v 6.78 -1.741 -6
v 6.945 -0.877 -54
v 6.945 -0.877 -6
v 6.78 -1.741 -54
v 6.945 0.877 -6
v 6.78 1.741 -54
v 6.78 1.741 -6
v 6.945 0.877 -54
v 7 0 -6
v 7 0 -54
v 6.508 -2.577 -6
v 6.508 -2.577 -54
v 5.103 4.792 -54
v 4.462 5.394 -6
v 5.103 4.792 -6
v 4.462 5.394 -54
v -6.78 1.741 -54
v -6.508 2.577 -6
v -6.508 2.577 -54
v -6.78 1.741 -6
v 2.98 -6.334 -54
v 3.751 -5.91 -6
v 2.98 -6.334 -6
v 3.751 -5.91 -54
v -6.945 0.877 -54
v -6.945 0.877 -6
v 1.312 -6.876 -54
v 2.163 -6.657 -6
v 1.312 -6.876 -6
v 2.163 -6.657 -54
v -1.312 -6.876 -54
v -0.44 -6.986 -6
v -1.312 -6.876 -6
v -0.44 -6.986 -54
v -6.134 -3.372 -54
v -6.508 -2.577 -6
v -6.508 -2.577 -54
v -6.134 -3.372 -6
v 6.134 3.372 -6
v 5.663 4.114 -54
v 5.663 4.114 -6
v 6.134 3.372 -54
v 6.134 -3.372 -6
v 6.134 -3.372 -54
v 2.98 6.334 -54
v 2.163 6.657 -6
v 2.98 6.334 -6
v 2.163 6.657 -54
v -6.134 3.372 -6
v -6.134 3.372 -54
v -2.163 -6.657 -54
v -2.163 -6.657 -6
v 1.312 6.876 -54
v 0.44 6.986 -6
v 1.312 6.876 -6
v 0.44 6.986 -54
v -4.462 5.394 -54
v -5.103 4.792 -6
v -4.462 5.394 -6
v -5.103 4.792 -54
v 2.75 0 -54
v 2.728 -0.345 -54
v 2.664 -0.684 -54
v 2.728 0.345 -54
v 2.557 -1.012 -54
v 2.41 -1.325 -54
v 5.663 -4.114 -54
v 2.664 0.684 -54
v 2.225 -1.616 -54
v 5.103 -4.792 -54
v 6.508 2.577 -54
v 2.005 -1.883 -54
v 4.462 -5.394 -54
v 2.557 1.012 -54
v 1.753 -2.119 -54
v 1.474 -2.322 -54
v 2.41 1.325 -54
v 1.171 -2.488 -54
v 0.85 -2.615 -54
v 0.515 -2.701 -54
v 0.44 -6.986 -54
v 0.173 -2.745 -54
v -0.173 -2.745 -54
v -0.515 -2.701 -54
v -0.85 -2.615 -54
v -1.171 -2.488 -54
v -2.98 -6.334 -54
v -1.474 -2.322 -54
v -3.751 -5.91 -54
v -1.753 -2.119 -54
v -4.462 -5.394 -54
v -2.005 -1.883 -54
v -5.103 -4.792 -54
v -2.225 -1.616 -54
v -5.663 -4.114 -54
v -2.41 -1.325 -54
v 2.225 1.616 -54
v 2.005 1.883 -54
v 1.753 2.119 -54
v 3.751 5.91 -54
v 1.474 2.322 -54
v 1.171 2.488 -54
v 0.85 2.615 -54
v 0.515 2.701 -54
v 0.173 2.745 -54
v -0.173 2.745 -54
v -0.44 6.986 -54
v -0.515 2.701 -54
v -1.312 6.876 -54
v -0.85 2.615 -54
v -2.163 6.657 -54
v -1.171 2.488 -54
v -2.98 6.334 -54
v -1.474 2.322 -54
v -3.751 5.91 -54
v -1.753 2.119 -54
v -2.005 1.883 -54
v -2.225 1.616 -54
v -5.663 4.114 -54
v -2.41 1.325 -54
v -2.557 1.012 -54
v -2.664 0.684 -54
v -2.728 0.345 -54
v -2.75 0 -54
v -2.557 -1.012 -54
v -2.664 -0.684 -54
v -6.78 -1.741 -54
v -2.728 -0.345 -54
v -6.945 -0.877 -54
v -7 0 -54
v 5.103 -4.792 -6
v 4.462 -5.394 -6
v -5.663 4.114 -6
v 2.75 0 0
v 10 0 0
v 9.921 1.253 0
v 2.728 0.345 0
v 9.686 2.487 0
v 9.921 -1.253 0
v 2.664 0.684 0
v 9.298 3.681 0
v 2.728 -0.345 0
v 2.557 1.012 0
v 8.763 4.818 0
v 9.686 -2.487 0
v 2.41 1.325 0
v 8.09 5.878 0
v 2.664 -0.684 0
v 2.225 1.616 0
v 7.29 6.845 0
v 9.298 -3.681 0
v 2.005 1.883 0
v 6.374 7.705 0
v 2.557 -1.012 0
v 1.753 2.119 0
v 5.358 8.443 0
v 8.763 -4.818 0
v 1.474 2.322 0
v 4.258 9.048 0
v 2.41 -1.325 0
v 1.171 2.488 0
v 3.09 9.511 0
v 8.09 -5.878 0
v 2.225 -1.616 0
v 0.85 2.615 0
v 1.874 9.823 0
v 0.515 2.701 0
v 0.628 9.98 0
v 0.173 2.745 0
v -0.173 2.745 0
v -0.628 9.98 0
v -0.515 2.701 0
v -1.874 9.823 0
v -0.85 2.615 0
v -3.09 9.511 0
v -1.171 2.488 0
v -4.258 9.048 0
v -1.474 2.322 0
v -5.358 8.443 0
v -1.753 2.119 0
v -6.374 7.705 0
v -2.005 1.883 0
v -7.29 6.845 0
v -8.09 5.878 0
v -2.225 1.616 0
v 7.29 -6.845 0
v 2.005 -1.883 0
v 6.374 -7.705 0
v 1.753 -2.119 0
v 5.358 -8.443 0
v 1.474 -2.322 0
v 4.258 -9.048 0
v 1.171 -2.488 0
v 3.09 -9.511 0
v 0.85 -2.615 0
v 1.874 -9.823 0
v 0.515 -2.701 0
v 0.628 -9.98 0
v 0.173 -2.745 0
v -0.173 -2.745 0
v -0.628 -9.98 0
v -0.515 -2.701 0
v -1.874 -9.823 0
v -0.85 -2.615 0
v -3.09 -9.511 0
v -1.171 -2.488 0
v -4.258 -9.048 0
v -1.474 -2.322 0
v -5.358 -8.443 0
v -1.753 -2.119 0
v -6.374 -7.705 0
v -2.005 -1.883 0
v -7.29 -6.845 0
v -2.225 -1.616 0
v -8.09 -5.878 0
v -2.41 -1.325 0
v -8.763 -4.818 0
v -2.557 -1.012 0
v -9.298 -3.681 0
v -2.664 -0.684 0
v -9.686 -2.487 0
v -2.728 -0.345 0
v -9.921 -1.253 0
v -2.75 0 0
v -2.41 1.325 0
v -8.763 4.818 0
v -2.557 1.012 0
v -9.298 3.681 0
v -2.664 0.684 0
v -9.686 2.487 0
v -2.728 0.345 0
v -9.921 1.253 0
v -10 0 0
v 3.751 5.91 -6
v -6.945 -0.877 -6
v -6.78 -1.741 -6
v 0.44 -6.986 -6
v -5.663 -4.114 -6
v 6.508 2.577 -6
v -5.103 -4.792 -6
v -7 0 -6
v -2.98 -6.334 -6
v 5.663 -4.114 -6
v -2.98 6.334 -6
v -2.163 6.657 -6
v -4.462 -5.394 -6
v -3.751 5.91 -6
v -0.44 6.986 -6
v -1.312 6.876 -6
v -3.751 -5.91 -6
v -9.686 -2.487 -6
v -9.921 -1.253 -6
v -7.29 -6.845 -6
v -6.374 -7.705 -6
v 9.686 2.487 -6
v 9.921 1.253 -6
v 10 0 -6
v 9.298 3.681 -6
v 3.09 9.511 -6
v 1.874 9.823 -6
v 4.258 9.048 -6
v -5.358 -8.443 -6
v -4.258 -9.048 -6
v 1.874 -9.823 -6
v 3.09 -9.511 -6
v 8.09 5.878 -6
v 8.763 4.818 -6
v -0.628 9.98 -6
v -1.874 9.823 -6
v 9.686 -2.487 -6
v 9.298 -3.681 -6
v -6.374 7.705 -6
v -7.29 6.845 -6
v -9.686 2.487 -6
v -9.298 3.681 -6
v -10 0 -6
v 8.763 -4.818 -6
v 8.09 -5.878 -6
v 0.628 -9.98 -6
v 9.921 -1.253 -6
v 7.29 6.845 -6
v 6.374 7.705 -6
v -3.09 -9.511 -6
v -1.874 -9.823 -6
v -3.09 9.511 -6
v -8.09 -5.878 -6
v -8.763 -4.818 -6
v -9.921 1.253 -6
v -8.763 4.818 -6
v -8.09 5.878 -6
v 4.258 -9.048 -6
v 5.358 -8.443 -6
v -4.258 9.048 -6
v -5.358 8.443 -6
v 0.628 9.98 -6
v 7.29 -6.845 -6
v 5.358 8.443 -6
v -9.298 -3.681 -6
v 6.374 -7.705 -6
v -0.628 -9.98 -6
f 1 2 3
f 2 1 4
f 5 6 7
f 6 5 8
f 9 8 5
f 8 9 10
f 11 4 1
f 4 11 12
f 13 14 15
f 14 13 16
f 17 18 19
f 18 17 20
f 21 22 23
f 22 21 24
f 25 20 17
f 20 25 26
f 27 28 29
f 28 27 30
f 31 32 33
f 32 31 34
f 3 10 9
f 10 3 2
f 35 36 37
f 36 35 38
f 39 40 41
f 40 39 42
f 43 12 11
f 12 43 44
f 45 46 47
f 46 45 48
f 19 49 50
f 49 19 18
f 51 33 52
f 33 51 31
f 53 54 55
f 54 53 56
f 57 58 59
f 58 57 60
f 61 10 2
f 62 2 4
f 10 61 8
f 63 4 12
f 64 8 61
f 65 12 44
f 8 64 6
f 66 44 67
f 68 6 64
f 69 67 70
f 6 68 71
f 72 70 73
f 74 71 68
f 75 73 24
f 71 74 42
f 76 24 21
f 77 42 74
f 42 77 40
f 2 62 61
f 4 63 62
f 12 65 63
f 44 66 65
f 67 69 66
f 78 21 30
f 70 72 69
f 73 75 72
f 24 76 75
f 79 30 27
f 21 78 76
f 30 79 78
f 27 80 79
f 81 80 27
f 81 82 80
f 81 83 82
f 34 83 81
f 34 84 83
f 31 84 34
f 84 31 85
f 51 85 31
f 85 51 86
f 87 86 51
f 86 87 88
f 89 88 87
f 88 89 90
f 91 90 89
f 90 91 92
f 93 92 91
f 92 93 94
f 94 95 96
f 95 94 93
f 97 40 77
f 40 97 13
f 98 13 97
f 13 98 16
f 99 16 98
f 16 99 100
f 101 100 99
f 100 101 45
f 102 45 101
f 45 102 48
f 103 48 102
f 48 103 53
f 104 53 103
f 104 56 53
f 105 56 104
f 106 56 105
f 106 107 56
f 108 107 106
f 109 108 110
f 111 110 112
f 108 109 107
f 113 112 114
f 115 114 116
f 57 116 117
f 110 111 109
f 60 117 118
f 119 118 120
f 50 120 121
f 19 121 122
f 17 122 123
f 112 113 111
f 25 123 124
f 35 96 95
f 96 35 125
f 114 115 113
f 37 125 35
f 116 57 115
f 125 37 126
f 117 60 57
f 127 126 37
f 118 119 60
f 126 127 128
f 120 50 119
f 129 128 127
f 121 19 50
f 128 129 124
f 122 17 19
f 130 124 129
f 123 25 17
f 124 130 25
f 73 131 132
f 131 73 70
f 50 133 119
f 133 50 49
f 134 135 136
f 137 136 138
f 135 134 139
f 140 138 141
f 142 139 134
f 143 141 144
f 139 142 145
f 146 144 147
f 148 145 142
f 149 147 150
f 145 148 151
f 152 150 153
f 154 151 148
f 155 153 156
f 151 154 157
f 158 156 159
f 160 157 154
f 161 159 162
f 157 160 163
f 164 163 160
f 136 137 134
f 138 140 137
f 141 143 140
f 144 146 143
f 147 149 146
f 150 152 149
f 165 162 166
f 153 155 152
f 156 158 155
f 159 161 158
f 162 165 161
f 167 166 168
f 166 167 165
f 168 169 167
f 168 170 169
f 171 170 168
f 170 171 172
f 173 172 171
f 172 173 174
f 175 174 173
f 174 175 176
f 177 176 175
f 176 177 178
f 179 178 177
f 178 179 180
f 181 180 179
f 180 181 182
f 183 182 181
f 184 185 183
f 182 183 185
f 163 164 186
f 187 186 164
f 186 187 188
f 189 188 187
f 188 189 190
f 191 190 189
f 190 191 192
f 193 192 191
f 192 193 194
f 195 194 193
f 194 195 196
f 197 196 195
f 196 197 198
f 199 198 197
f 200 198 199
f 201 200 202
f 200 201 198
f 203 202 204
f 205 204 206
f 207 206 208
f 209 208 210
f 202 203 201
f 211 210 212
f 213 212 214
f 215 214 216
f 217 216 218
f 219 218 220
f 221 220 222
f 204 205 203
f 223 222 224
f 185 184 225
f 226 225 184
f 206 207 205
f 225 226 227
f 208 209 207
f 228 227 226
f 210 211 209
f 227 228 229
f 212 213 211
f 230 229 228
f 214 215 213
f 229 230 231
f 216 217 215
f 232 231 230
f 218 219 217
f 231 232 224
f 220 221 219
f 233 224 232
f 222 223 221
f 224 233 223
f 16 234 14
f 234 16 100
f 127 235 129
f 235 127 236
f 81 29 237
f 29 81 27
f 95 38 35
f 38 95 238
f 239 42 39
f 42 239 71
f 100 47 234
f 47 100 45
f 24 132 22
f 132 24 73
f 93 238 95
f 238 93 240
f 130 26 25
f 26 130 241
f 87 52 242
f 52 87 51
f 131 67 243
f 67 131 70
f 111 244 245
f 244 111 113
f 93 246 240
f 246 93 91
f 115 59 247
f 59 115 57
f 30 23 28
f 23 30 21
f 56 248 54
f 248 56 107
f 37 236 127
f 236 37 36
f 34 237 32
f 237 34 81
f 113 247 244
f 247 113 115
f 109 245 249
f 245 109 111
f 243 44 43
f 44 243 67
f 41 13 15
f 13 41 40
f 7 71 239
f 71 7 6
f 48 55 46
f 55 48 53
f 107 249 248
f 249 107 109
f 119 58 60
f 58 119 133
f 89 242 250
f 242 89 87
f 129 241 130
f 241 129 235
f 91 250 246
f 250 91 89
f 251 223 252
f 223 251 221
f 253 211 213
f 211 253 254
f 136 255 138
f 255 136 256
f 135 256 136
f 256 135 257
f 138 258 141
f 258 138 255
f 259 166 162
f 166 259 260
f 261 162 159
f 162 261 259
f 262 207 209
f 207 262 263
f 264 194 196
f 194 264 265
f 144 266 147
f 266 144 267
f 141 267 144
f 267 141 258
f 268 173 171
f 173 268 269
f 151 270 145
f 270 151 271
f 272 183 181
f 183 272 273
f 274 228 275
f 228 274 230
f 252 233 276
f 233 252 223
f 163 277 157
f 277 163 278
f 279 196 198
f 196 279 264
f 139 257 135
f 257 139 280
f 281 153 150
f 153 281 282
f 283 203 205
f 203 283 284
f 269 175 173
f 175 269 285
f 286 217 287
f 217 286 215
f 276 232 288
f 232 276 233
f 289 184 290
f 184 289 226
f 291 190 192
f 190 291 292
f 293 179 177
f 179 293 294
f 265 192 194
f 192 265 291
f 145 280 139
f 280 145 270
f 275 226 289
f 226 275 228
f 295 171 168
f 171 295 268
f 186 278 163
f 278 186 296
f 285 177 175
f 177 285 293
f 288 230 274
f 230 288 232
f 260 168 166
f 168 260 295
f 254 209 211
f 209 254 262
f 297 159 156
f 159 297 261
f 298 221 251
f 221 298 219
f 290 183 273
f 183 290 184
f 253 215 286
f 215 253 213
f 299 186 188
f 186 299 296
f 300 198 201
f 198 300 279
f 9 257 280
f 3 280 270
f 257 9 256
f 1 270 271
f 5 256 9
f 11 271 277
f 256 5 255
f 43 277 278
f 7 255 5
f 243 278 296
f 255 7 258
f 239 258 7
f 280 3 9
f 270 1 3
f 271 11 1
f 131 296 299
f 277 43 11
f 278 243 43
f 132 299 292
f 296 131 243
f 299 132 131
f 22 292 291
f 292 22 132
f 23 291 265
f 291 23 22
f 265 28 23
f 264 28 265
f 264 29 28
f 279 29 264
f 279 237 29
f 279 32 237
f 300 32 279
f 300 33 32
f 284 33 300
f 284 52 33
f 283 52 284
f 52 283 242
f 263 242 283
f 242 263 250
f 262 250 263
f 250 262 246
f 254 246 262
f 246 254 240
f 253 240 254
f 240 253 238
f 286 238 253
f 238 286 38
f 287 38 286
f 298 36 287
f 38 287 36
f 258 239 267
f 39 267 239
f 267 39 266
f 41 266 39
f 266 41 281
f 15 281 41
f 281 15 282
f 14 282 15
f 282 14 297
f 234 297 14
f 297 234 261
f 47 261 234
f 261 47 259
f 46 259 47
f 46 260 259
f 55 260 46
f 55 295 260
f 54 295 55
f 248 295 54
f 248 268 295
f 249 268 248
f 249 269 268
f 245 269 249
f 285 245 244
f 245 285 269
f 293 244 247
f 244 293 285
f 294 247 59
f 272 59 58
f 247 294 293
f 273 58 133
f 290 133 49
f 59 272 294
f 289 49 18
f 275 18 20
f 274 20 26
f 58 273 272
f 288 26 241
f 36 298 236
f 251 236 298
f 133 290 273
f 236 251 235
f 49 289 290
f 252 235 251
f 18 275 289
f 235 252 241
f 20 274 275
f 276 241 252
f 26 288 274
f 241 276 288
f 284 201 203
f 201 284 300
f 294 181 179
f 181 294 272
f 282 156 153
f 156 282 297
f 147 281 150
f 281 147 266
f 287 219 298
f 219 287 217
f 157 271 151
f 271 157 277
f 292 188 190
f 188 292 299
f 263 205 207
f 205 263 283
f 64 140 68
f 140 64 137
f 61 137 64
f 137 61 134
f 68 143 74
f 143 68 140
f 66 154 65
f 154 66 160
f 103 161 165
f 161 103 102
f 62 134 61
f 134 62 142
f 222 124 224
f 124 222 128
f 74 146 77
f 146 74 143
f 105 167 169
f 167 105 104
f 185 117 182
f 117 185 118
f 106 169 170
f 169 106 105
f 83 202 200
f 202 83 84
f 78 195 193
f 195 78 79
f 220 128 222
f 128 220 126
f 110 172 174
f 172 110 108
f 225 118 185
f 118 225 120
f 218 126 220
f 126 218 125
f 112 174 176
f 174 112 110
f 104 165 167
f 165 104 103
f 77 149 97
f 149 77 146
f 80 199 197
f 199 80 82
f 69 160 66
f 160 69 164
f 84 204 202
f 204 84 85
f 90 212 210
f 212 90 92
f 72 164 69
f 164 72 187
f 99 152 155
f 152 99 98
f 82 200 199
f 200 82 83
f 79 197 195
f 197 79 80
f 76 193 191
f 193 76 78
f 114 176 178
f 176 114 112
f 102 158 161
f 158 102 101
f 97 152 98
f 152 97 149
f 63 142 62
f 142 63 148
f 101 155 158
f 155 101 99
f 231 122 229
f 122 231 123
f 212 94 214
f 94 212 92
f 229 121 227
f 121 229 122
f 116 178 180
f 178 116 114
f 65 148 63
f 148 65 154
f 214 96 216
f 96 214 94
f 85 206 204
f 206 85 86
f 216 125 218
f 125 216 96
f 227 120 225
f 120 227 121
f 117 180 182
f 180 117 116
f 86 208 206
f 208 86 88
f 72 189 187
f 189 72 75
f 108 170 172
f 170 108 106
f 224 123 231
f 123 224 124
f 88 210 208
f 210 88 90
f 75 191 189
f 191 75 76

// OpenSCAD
$fn = 50;


difference() {
	union() {
		translate(v = [0, 0, -54.0000000000]) {
			cylinder(h = 54, r = 7.0000000000);
		}
		translate(v = [0, 0, -6.0000000000]) {
			cylinder(h = 6, r = 10.0000000000);
		}
	}
	union() {
		#translate(v = [0, 0, -54]) {
			cylinder(h = 54, r = 2.7500000000);
		}
	}
}
